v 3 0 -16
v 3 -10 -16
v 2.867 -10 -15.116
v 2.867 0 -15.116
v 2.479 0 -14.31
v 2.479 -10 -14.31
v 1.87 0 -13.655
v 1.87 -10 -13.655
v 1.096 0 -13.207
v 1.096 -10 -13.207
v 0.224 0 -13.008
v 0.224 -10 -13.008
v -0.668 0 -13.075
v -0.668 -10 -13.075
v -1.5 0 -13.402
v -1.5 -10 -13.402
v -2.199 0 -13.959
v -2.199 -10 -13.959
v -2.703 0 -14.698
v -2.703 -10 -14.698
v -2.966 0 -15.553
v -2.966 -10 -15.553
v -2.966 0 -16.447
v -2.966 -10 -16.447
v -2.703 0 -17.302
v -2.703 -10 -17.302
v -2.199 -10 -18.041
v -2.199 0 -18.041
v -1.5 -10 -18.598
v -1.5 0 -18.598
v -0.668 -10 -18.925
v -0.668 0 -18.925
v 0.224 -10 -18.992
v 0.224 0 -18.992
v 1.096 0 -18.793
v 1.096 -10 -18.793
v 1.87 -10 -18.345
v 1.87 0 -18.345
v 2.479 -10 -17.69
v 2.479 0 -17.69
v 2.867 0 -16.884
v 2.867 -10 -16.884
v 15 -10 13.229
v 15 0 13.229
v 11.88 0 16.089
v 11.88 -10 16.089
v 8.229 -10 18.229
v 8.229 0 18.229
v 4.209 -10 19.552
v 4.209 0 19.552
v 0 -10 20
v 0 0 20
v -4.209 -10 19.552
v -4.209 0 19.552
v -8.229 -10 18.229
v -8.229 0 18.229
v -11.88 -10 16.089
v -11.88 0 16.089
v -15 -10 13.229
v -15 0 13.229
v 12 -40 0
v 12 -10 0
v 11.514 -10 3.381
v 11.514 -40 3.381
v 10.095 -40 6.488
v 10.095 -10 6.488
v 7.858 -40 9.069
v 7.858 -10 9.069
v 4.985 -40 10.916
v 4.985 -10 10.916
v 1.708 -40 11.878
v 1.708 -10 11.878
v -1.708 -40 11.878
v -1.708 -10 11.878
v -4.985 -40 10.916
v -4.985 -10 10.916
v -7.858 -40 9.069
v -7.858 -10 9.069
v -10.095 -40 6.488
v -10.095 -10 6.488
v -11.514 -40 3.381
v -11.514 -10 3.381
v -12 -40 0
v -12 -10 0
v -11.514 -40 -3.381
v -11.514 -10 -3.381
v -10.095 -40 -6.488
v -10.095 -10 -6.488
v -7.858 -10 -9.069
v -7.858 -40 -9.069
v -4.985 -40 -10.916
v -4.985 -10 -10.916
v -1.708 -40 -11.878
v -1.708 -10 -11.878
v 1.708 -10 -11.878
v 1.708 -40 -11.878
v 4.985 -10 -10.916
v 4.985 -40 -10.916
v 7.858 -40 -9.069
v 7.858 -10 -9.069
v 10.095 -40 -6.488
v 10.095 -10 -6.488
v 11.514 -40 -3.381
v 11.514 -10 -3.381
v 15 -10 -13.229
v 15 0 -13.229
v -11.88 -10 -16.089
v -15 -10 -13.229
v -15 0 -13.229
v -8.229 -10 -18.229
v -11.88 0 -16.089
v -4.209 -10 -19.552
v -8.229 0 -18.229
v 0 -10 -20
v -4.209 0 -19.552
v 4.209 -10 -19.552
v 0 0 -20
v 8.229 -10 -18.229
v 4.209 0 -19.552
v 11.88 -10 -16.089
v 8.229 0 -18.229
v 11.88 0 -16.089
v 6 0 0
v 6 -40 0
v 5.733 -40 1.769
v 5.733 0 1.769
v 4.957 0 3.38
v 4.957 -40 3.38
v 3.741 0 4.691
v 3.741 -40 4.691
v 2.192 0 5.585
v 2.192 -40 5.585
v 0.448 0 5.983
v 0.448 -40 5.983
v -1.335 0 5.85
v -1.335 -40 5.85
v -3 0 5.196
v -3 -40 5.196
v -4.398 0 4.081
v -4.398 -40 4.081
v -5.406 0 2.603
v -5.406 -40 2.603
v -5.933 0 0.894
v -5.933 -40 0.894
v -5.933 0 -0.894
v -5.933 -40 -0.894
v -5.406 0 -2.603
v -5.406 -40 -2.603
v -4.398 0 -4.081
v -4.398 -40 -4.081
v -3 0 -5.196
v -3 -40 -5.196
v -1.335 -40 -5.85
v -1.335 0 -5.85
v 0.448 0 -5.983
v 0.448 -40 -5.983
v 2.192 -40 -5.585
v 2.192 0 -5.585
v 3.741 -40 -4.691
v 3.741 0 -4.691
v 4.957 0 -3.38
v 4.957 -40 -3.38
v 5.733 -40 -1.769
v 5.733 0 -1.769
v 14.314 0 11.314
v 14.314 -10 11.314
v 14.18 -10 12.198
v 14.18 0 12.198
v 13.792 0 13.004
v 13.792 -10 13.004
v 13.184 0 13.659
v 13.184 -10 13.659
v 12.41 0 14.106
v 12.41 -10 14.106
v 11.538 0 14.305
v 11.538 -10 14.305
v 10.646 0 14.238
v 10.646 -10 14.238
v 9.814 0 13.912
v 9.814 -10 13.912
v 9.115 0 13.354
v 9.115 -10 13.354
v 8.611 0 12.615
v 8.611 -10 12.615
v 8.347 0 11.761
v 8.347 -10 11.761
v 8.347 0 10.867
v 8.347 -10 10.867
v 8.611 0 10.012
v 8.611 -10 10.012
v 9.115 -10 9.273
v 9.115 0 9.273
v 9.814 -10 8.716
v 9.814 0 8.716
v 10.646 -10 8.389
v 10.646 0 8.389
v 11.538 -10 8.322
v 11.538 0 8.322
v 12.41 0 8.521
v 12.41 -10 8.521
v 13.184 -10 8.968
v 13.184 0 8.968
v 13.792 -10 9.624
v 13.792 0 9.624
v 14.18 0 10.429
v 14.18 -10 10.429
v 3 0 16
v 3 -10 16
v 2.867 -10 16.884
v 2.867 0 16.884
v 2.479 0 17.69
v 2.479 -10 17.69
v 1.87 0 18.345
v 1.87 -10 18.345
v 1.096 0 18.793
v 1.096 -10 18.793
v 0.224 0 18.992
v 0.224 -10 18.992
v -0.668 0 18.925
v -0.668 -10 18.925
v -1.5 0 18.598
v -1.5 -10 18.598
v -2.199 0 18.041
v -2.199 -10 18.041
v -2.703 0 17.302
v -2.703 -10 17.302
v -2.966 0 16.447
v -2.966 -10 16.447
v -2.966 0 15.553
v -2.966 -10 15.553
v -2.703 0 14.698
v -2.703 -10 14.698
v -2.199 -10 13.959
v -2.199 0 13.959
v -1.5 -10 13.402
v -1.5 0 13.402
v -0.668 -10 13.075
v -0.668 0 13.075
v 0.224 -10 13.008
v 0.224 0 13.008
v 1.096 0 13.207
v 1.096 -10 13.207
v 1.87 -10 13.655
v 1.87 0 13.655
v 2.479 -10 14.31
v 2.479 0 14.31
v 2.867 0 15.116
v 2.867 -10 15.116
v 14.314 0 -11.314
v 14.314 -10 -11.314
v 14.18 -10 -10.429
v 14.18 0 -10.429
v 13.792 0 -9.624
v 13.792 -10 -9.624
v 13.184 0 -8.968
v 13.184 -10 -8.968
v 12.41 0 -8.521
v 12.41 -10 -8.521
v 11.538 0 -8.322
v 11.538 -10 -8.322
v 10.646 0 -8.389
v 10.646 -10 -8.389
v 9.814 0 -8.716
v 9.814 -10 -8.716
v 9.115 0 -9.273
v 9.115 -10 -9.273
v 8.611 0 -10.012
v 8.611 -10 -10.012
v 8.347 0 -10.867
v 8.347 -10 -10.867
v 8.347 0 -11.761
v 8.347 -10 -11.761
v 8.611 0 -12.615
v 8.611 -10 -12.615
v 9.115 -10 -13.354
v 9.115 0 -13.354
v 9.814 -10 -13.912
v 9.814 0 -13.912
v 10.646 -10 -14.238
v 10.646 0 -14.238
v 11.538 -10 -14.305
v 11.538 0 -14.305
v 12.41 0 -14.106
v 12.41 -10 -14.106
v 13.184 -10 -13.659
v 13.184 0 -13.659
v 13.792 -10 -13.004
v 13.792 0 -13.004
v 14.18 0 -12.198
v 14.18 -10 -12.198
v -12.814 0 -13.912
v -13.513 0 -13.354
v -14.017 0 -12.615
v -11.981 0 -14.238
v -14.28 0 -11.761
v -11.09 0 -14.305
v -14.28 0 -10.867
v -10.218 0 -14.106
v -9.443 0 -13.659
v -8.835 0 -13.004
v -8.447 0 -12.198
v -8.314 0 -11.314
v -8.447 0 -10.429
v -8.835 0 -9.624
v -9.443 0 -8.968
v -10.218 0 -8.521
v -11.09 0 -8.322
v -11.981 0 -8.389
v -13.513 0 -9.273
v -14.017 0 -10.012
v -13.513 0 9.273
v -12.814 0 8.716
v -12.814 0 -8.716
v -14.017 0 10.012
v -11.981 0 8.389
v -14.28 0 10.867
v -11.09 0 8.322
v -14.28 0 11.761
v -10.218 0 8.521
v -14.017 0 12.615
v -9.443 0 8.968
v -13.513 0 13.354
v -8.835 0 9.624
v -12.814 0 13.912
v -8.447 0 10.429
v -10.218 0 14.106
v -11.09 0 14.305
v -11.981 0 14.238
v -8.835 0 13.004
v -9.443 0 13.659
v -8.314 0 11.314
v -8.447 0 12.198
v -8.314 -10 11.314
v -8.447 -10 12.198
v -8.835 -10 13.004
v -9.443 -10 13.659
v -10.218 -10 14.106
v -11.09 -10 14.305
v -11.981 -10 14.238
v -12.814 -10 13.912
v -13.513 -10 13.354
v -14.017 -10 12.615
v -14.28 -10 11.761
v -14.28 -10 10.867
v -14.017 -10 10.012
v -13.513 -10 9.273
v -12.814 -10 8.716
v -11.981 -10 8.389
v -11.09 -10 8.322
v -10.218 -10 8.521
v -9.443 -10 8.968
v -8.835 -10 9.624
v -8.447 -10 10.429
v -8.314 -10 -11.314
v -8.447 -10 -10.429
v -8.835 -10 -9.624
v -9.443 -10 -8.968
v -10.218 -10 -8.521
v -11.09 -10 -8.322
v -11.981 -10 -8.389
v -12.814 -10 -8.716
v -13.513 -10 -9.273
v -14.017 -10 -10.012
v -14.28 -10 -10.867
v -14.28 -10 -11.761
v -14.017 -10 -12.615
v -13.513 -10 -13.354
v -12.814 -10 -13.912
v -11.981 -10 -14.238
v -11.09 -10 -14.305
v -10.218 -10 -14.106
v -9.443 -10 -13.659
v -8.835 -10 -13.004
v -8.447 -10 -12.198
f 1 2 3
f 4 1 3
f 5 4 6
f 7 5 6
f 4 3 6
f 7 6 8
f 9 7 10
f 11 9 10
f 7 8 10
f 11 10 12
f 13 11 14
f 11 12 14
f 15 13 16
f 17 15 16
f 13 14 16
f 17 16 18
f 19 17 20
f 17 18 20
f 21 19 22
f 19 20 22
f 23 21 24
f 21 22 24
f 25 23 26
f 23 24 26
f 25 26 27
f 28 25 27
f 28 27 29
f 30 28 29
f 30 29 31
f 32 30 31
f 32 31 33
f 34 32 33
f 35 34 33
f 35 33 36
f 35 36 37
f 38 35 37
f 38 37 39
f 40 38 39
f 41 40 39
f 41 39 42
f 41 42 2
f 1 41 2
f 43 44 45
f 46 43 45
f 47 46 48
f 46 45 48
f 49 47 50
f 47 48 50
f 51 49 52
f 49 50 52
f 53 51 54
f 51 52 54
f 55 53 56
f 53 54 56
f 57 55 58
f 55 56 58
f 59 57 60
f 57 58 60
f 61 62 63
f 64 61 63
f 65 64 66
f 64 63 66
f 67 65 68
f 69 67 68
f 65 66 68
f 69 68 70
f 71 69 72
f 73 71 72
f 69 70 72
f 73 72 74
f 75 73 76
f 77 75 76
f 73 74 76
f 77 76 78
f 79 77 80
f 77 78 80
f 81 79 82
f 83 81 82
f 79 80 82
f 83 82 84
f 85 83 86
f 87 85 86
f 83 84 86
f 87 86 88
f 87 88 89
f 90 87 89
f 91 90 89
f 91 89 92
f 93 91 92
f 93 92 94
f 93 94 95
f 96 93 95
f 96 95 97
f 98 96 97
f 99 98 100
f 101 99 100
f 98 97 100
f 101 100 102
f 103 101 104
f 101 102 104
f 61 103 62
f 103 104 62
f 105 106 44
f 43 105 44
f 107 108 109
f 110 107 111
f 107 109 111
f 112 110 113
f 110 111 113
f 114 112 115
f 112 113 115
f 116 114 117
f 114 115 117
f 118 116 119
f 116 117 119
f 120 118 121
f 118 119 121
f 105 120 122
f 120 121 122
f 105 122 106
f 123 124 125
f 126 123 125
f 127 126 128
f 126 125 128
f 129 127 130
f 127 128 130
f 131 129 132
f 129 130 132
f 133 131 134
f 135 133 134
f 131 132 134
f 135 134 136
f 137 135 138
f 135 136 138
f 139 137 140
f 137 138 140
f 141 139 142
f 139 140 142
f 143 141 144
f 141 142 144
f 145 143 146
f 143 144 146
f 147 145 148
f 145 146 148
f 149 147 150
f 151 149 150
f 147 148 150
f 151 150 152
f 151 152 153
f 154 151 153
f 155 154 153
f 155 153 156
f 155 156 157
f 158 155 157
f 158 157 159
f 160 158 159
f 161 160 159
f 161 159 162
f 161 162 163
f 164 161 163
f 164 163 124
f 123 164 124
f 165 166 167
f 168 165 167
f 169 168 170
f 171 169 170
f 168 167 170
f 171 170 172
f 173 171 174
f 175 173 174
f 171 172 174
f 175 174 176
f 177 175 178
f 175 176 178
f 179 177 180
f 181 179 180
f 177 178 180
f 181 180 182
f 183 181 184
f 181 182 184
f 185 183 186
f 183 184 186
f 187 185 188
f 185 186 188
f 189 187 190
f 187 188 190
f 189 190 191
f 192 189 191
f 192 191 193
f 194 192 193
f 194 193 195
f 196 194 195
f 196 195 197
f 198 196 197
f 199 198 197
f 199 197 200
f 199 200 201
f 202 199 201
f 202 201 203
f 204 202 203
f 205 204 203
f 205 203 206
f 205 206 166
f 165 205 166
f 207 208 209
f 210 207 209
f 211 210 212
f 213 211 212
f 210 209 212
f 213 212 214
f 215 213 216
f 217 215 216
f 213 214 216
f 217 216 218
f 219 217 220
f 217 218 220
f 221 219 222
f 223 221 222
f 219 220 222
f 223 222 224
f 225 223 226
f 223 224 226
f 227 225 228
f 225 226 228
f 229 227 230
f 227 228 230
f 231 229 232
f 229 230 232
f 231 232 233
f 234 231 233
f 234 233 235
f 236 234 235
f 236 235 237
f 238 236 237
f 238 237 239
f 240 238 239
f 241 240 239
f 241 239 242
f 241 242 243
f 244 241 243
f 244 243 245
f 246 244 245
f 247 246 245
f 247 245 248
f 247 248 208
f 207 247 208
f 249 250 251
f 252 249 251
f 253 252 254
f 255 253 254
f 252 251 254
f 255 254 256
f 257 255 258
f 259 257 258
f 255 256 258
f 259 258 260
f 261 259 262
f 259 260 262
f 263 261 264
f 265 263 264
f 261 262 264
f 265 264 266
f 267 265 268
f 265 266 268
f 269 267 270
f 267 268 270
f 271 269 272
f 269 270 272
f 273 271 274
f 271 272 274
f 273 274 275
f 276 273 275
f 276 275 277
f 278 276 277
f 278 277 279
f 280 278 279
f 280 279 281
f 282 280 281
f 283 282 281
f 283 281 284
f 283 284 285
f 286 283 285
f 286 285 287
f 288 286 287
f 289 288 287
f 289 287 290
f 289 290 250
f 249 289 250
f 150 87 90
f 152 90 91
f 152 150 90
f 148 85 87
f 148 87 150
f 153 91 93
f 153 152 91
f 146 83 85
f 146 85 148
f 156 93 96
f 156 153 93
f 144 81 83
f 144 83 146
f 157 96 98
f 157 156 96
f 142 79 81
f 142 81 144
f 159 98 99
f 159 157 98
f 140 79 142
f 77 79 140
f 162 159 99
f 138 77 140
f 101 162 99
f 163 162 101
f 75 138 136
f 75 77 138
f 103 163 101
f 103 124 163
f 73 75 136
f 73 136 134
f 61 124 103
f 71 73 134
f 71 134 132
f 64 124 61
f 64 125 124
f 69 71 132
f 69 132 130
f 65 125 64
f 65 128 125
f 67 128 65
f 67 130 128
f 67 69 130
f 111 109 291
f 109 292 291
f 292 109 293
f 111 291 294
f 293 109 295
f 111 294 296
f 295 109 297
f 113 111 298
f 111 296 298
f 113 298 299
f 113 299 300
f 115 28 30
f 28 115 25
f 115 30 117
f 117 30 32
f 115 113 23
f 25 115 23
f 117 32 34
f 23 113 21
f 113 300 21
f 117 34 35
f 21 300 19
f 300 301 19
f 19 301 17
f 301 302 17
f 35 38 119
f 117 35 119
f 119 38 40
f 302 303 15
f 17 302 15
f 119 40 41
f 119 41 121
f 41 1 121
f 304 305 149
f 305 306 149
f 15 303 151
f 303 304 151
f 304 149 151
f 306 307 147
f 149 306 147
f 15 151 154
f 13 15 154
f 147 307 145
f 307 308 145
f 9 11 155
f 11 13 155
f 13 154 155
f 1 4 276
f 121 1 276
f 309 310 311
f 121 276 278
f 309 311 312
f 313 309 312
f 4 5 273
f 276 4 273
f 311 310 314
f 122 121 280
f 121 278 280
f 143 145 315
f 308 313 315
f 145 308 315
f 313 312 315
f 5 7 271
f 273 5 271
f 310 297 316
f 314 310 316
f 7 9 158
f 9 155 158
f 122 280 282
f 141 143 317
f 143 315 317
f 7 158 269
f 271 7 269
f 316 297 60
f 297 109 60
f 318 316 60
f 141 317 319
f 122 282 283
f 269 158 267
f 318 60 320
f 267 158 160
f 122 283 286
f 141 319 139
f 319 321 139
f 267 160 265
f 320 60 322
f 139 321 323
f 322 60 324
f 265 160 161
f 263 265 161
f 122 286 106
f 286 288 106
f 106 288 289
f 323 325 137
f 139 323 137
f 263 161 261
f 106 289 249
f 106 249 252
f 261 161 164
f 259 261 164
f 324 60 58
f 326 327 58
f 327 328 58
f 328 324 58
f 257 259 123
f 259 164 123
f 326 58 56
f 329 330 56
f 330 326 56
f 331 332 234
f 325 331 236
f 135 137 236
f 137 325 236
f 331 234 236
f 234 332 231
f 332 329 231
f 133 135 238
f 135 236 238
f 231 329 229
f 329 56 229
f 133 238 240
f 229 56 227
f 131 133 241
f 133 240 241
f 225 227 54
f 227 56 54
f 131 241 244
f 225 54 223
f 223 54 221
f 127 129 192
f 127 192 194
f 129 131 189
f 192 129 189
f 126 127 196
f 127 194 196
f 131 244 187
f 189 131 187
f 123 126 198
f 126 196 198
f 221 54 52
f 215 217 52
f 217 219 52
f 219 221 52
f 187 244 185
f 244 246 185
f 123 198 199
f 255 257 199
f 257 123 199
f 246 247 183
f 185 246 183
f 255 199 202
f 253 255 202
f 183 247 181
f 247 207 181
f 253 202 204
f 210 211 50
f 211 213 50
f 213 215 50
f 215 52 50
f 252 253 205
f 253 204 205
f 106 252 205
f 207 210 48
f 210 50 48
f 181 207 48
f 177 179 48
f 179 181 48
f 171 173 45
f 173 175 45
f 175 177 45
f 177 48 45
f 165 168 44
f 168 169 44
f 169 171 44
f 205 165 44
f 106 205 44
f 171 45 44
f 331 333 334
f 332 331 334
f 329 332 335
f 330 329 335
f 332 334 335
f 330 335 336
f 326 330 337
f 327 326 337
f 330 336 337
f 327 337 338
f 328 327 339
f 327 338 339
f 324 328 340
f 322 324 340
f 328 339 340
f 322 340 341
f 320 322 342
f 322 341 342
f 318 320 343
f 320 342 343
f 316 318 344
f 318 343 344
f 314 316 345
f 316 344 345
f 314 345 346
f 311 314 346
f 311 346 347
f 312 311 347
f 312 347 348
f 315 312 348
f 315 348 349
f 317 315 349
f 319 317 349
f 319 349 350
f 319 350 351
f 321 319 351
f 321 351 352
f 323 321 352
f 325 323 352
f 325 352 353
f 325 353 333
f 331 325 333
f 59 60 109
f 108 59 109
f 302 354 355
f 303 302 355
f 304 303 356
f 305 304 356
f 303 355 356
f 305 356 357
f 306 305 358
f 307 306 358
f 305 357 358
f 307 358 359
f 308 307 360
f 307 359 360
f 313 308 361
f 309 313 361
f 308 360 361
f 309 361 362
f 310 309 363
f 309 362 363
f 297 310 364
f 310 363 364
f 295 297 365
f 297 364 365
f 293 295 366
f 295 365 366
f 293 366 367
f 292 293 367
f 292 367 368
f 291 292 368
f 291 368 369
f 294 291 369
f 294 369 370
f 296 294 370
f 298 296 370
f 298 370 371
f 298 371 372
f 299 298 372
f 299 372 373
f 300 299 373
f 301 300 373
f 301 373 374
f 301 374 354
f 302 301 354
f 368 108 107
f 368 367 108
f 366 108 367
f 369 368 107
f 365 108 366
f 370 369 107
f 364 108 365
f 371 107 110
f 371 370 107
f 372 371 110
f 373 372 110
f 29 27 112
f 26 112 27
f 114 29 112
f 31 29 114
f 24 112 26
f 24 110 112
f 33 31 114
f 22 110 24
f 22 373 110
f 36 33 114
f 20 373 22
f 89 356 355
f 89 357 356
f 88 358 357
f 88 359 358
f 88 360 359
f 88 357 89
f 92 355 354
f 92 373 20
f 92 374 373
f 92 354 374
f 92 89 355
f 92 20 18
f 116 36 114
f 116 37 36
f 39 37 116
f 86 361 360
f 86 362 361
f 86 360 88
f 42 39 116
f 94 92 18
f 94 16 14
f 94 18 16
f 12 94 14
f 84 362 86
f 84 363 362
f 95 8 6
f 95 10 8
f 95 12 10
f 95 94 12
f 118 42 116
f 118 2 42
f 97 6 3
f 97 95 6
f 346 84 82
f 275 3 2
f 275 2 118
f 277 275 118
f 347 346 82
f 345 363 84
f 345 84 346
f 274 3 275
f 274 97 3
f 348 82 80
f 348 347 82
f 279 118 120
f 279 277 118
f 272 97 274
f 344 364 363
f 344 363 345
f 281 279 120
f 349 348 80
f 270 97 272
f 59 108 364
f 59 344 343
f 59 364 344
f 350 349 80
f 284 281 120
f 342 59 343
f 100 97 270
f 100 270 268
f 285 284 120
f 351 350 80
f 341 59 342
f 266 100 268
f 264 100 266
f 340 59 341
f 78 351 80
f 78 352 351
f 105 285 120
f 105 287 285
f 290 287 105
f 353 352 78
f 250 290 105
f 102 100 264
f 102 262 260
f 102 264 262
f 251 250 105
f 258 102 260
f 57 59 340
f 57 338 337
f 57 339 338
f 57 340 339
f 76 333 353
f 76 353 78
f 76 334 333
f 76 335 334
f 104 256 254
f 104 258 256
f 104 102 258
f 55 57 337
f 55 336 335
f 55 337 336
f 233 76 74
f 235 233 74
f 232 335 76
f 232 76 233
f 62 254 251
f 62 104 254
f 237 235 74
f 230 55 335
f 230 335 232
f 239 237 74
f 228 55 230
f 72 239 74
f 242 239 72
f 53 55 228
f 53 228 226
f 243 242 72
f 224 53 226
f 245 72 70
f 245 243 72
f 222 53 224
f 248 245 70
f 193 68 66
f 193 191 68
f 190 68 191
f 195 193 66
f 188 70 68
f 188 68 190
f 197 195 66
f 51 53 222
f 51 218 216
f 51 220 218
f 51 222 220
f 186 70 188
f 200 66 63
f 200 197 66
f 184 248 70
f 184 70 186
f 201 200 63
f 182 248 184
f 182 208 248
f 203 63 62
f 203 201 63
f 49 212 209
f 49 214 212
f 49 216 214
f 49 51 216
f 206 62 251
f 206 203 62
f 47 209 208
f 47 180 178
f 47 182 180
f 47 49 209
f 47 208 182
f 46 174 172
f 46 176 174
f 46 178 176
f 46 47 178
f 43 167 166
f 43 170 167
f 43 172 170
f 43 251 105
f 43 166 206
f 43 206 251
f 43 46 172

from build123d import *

# Parameters (mm, degrees)
F0_R     = 20
F1_DEPTH = 10
F2_R     = 12
F3_DEPTH = 30
F4_R     = 6
F5_DEPTH = 40.001
F7_DEPTH = 25
F9_D     = 6


with BuildPart() as f1:
    # F0 (on Front) → F1 (new body)
    with BuildSketch(Plane.XZ):
        Circle(F0_R)
    extrude(amount=F1_DEPTH)

    # F2 (on face) → F3 (join)
    with BuildSketch(Plane.XZ.offset(10)):
        Circle(F2_R)
    extrude(amount=F3_DEPTH)

    # F4 (on face) → F5 (cut, through all)
    with BuildSketch(Plane.XZ.offset(40)):
        Circle(F4_R)
    extrude(amount=-F5_DEPTH, mode=Mode.SUBTRACT)

    # F6 (on face) → F7 (cut)
    with BuildSketch(Plane(origin=(0, 0, 0), x_dir=(-1, 0, 0), z_dir=(0, 1, 0))):
        with BuildLine():
            Line((-15, -13.228757), (-15, 0))
            Line((-15, 0), (-15, 13.228757))
            ThreePointArc((-15, 13.228757), (-20, 0), (-15, -13.228757))
        make_face()
        with BuildLine():
            ThreePointArc((20, 0), (18.708287, 7.071068), (15, 13.228757))
            Line((15, 13.228757), (15, 0))
            Line((15, 0), (15, -13.228757))
            ThreePointArc((15, -13.228757), (18.708287, -7.071068), (20, 0))
        make_face()
    extrude(amount=-F7_DEPTH, mode=Mode.SUBTRACT)

    # F9 (through all)
    with Locations(Plane(origin=(0, 0, 0), x_dir=(-1, 0, 0), z_dir=(0, 1, 0))):
        with Locations((-11.313708, 11.313708), (0, 16), (11.313708, 11.313708), (-11.313708, -11.313708), (0, -16), (11.313708, -11.313708)):
            Hole(F9_D / 2)


solid = f1.part
